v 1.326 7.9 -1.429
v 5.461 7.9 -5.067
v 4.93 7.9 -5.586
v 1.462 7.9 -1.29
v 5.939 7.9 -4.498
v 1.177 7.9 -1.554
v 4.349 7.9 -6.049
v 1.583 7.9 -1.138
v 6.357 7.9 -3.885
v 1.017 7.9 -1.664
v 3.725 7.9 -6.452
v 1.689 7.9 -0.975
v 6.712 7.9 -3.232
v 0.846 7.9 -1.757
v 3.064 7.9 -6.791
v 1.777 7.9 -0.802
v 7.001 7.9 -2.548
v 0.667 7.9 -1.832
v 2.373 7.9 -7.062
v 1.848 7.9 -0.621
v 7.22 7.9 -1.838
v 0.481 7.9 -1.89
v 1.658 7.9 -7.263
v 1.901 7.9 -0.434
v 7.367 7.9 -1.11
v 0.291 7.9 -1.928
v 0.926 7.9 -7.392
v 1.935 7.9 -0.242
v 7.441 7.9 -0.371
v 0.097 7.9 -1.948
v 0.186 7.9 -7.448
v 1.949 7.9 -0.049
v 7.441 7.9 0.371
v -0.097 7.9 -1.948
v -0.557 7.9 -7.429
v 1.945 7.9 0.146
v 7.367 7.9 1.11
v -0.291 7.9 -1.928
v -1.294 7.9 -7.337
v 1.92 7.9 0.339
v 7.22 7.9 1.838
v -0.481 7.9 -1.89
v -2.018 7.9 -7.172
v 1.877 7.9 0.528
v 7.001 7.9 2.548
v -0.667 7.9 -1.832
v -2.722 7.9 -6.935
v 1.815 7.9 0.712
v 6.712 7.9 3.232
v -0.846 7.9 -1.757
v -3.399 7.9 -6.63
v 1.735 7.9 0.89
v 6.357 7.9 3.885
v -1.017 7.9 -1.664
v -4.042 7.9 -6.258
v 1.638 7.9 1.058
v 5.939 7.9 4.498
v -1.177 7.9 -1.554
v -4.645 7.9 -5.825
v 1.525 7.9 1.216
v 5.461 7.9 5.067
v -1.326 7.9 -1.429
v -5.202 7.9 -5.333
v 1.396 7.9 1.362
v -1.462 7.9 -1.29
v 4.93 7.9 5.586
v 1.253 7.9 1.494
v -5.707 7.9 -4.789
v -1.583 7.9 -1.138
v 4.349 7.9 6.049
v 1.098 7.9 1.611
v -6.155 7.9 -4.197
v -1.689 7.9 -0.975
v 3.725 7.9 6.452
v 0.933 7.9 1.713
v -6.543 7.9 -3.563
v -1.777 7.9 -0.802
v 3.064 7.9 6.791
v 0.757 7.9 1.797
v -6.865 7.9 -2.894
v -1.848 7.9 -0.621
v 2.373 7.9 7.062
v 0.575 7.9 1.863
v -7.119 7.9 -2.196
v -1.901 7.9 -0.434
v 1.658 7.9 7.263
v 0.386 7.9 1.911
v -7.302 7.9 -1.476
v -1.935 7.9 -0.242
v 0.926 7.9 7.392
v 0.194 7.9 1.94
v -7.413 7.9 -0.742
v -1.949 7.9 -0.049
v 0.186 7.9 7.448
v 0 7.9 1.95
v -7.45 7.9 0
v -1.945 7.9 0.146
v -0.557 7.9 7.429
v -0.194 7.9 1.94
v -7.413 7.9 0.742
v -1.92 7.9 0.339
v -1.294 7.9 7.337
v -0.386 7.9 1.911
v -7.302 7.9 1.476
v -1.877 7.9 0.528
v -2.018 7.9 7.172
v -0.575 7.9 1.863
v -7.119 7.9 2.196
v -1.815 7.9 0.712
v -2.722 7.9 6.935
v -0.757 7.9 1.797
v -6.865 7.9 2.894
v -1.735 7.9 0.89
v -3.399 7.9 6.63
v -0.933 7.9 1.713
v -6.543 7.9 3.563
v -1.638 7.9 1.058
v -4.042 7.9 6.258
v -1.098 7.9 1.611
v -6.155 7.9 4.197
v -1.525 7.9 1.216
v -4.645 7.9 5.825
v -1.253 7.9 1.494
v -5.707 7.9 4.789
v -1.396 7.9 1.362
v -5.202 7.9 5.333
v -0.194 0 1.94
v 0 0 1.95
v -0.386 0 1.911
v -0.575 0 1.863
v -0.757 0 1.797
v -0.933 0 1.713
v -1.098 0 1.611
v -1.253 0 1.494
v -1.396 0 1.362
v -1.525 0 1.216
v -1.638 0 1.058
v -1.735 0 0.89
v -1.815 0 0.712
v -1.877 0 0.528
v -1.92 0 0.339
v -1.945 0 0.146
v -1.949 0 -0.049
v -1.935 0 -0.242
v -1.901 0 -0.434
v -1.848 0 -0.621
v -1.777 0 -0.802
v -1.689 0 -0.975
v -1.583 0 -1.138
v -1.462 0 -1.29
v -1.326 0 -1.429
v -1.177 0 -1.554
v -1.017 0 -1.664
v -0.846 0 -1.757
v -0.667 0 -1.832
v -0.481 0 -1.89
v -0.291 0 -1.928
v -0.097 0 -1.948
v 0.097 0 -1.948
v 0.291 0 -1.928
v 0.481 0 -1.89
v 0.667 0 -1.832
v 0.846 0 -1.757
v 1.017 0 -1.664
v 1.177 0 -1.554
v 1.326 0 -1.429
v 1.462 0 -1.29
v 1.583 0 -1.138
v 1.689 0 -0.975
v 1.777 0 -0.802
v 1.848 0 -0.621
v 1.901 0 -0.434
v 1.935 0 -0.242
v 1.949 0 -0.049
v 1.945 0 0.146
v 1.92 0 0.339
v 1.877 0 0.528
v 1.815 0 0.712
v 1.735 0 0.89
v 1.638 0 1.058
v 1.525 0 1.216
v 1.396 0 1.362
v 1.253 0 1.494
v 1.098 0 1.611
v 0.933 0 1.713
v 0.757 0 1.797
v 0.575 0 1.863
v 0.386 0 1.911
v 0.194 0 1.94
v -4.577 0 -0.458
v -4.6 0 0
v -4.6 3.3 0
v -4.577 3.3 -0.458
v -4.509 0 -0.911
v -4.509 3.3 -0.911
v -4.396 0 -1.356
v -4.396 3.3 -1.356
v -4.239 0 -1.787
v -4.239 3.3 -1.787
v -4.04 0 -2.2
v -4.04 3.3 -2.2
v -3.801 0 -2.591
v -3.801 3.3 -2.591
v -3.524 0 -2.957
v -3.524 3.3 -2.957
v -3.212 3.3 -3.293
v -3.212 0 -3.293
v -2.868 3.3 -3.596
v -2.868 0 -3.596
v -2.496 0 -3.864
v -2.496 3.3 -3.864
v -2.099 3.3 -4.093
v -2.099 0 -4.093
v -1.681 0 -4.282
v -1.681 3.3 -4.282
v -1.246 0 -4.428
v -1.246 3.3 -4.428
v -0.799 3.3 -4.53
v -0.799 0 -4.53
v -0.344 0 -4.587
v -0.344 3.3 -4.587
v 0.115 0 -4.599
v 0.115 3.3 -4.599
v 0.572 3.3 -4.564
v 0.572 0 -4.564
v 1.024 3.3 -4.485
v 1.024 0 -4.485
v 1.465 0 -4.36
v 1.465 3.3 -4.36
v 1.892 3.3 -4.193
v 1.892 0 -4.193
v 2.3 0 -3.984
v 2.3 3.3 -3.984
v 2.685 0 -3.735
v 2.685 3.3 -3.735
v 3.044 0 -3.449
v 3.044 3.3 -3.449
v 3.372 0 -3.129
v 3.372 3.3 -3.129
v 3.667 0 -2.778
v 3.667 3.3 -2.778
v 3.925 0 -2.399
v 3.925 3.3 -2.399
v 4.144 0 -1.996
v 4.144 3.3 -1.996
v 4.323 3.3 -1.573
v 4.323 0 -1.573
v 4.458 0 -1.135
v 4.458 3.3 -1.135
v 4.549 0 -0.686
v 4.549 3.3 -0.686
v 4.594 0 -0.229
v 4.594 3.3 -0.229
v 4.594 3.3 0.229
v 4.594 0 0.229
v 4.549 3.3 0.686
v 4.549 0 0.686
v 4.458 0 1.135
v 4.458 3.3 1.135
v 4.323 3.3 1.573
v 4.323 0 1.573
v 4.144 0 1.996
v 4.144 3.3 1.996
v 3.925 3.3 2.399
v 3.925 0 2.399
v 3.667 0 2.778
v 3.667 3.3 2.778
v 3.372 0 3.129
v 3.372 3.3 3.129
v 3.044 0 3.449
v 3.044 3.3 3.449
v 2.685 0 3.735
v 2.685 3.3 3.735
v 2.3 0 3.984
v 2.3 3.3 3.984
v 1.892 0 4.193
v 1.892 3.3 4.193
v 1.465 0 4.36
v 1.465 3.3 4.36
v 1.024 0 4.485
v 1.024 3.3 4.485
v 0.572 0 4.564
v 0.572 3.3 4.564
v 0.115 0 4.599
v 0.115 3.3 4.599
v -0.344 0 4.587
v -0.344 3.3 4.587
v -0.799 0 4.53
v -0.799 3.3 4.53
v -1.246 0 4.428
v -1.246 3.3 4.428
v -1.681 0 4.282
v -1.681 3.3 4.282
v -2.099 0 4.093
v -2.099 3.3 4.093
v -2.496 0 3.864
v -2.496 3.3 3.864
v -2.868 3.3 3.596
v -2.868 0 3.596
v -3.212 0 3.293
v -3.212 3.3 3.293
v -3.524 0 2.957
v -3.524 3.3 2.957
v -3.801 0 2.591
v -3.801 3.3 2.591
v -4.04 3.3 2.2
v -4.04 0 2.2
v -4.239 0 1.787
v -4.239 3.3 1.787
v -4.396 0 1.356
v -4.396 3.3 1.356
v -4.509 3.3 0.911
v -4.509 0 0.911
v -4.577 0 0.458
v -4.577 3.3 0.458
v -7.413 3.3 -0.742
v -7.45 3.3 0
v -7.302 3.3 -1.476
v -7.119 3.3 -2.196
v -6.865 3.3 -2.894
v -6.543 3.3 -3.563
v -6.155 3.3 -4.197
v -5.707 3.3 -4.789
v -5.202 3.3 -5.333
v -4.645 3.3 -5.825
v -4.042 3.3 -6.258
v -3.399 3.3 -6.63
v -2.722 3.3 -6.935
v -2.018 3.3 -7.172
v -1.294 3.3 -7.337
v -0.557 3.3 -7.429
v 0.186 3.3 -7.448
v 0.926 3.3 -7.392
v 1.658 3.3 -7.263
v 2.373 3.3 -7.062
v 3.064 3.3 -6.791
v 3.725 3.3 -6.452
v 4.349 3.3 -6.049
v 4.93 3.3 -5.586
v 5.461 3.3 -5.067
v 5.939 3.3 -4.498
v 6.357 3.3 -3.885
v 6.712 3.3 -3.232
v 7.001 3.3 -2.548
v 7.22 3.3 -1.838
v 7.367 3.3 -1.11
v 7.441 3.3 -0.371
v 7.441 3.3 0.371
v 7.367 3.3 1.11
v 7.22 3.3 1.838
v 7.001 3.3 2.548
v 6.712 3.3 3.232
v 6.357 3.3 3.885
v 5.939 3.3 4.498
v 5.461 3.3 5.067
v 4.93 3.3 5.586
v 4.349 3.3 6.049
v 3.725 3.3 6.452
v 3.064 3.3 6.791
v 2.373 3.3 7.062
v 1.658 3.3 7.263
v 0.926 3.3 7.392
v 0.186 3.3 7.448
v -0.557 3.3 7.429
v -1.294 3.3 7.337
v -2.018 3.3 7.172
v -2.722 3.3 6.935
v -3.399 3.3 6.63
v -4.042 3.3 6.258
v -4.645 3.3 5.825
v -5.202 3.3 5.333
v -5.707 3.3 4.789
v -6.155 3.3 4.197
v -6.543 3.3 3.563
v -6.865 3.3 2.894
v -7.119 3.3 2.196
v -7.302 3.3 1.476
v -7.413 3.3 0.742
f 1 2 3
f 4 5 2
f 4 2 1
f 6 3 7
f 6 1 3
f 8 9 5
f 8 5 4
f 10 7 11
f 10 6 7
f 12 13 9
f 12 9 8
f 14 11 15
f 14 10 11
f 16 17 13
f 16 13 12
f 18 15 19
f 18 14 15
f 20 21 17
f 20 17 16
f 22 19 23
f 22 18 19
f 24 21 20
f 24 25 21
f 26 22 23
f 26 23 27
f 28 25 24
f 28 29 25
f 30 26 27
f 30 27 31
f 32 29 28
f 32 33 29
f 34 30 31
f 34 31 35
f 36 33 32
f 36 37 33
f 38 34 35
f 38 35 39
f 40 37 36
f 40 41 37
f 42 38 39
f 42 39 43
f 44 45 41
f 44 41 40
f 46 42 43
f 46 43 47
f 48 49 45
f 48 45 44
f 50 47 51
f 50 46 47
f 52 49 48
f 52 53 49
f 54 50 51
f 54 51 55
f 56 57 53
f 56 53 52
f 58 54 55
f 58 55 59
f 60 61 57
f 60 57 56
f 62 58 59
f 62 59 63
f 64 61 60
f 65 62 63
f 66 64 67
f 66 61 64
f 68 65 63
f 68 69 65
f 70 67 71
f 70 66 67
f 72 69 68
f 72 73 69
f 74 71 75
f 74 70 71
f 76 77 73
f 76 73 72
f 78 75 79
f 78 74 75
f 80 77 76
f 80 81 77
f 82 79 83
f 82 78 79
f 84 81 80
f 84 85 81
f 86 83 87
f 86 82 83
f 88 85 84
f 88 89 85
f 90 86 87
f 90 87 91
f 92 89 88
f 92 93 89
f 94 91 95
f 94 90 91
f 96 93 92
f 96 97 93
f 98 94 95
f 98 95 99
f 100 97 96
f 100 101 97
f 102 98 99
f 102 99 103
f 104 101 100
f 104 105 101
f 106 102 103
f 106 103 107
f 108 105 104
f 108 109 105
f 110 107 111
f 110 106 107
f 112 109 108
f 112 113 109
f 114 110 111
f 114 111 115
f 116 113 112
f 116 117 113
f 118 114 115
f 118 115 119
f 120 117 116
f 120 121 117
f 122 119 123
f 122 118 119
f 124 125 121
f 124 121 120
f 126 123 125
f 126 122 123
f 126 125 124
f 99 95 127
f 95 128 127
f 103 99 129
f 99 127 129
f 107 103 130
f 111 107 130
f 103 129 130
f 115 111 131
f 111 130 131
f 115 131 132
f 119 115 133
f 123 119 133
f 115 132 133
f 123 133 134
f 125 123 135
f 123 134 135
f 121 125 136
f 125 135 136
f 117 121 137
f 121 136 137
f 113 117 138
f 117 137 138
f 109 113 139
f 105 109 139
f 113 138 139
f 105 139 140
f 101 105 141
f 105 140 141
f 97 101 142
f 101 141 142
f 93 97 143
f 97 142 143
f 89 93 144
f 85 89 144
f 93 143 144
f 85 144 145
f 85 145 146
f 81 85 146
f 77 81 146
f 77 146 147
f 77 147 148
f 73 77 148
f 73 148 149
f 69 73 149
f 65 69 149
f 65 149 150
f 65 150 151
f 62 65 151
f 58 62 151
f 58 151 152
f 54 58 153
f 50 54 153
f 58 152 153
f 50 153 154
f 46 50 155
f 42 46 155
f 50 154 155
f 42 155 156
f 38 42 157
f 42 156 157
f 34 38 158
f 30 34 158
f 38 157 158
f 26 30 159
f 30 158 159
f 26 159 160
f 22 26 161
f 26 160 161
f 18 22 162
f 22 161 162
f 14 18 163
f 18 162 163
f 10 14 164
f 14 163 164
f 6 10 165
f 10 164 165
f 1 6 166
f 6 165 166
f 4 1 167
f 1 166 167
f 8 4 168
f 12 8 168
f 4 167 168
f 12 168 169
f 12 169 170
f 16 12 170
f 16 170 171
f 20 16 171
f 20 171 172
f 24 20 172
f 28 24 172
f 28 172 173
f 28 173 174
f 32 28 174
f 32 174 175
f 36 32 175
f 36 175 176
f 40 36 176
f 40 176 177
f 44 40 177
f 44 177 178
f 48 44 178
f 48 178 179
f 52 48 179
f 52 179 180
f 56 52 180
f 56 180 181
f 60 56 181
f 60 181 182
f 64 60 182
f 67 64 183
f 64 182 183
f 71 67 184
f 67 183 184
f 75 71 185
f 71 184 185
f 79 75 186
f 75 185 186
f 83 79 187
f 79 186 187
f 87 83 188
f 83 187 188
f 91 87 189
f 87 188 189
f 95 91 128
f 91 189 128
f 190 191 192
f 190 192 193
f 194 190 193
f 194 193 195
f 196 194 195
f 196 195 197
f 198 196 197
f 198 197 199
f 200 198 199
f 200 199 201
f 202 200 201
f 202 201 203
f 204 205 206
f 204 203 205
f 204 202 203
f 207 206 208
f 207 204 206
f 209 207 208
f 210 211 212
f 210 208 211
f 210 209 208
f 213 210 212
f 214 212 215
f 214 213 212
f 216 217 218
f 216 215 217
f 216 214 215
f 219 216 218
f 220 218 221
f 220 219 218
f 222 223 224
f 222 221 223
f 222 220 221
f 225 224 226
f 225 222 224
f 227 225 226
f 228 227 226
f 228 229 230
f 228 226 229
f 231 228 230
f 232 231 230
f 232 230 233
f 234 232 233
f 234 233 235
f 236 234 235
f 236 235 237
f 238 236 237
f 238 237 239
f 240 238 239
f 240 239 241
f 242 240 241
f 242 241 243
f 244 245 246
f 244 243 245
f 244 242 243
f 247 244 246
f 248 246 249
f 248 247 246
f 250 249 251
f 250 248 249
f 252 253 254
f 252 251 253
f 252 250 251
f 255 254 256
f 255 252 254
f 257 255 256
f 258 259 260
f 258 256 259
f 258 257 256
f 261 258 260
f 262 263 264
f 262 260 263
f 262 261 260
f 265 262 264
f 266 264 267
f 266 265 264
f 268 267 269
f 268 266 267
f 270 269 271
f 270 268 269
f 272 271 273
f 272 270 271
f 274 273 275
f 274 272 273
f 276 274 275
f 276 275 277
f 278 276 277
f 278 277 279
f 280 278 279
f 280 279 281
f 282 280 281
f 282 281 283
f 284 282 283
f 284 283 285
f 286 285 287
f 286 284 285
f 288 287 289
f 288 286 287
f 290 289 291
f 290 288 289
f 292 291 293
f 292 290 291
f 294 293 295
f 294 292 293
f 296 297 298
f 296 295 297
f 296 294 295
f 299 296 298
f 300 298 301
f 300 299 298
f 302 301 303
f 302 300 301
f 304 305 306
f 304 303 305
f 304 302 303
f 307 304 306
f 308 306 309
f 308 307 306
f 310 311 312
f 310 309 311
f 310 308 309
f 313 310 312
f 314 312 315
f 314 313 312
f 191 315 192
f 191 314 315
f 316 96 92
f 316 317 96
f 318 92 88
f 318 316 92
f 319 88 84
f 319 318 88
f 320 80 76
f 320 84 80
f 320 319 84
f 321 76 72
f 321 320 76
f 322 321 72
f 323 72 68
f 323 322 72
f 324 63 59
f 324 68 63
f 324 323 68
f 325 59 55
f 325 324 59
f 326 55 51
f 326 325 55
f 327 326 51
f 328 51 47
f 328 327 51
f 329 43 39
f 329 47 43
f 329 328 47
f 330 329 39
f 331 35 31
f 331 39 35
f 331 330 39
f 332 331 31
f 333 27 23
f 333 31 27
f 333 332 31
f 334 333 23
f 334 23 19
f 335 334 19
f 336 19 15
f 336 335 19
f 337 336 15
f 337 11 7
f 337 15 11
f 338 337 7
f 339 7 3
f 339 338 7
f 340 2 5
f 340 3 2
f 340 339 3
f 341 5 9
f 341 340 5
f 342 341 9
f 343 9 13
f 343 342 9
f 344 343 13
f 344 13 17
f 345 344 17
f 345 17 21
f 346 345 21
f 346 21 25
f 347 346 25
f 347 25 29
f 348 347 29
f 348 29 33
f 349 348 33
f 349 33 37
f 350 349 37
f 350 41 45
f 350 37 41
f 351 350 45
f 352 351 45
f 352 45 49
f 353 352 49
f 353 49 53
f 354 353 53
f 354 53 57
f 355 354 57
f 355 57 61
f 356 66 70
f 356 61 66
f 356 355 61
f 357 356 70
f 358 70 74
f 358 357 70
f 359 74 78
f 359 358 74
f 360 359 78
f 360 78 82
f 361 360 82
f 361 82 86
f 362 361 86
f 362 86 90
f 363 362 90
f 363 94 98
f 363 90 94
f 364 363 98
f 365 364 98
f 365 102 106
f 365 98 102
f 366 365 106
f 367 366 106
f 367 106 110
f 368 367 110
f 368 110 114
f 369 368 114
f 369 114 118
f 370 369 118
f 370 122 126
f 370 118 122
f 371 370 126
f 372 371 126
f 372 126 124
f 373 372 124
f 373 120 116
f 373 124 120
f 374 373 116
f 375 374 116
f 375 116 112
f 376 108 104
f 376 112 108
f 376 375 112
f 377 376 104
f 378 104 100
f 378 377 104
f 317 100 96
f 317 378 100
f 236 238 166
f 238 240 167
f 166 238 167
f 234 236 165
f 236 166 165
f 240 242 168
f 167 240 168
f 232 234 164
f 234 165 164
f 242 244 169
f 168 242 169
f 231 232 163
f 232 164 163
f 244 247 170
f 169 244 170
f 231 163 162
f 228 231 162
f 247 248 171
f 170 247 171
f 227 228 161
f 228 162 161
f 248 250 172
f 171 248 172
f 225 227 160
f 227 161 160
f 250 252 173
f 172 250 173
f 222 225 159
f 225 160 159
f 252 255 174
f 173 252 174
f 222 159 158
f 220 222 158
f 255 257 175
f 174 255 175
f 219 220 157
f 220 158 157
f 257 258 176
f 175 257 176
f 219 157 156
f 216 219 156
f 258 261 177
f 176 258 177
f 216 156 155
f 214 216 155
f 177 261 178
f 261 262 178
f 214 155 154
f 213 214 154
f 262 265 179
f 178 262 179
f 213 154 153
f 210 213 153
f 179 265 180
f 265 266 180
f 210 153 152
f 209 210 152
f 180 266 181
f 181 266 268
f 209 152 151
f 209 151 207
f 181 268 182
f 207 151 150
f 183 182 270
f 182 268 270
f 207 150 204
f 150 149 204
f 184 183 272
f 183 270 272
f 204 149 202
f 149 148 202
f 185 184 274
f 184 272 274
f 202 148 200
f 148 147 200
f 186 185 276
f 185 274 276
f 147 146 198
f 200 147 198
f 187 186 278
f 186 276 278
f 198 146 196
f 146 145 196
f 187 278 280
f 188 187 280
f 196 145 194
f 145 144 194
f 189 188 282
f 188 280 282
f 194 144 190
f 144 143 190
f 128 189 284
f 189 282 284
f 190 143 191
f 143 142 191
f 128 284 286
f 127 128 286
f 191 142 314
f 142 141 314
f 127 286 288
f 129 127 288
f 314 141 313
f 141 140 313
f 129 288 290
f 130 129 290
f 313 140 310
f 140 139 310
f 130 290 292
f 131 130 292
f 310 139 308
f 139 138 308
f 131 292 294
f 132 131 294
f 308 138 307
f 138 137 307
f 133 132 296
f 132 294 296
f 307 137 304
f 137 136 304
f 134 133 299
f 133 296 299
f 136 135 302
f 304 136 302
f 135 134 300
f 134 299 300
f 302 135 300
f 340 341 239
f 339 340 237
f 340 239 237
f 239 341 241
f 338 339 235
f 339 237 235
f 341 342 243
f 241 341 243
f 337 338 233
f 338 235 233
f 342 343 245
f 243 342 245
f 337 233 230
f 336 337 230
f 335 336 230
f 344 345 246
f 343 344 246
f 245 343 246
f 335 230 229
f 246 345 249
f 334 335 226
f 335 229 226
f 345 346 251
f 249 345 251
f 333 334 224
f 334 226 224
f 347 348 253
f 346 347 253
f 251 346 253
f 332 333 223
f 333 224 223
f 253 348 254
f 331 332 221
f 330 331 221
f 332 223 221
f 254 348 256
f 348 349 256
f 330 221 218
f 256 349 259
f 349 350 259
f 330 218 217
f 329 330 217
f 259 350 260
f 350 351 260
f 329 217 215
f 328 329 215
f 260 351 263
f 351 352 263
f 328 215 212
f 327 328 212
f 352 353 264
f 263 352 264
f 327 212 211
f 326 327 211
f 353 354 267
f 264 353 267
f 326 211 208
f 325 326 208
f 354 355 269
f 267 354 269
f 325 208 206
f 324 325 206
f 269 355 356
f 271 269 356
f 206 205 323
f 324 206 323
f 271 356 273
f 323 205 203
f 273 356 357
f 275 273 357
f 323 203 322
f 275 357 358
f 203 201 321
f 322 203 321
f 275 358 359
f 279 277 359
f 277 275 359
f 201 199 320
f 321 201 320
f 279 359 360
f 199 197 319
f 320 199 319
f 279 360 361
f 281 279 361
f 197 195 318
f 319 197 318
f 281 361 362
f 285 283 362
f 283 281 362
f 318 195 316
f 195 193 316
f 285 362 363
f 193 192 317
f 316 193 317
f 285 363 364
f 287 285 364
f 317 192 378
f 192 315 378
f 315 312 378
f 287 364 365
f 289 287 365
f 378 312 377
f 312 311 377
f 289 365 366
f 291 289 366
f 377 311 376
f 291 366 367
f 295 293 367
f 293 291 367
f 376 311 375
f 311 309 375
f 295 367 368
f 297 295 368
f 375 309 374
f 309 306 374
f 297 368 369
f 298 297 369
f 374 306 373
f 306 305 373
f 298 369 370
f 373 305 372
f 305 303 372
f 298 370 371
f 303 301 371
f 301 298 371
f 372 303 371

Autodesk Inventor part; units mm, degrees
ref_plane "YZ Plane" through (0, 0, 0) normal (1, 0, 0) x (0, 1, 0)
ref_plane "XZ Plane" through (0, 0, 0) normal (0, 1, 0) x (-1, 0, 0)
ref_plane "XY Plane" through (0, 0, 0) normal (0, 0, 1) x (1, 0, 0)
sketch "Sketch1" plane through (0, 0, 0) normal (0, 1, 0) x (-1, 0, 0)
  circle A0 centre (0, 0) radius 7.45
  dimension "d0" = 14.9
extrude "Extrusion1" add sketch "Sketch1" along normal blind 7.9
sketch "Sketch2" plane through (0, 0, 0) normal (0, 1, 0) x (-1, 0, 0)
  circle A0 centre (0, 0) radius 4.6
  circle A1 centre (0, 0) radius 7.45
  dimension "d3" = 9.2
extrude "Extrusion2" cut sketch "Sketch2" along normal blind 3.3
sketch "Sketch3" plane through (0, 7.9, 0) normal (0, 1, 0) x (1, 0, 0)
  point P0 (0, 0)
  point P1 (0, 0)
hole "Hole1" at (0, 7.9, 0) direction (0, -1, 0) diameter 3.9 end through all
properties part number "HeadBarClampTurnwheel" material "UHMW, White"
